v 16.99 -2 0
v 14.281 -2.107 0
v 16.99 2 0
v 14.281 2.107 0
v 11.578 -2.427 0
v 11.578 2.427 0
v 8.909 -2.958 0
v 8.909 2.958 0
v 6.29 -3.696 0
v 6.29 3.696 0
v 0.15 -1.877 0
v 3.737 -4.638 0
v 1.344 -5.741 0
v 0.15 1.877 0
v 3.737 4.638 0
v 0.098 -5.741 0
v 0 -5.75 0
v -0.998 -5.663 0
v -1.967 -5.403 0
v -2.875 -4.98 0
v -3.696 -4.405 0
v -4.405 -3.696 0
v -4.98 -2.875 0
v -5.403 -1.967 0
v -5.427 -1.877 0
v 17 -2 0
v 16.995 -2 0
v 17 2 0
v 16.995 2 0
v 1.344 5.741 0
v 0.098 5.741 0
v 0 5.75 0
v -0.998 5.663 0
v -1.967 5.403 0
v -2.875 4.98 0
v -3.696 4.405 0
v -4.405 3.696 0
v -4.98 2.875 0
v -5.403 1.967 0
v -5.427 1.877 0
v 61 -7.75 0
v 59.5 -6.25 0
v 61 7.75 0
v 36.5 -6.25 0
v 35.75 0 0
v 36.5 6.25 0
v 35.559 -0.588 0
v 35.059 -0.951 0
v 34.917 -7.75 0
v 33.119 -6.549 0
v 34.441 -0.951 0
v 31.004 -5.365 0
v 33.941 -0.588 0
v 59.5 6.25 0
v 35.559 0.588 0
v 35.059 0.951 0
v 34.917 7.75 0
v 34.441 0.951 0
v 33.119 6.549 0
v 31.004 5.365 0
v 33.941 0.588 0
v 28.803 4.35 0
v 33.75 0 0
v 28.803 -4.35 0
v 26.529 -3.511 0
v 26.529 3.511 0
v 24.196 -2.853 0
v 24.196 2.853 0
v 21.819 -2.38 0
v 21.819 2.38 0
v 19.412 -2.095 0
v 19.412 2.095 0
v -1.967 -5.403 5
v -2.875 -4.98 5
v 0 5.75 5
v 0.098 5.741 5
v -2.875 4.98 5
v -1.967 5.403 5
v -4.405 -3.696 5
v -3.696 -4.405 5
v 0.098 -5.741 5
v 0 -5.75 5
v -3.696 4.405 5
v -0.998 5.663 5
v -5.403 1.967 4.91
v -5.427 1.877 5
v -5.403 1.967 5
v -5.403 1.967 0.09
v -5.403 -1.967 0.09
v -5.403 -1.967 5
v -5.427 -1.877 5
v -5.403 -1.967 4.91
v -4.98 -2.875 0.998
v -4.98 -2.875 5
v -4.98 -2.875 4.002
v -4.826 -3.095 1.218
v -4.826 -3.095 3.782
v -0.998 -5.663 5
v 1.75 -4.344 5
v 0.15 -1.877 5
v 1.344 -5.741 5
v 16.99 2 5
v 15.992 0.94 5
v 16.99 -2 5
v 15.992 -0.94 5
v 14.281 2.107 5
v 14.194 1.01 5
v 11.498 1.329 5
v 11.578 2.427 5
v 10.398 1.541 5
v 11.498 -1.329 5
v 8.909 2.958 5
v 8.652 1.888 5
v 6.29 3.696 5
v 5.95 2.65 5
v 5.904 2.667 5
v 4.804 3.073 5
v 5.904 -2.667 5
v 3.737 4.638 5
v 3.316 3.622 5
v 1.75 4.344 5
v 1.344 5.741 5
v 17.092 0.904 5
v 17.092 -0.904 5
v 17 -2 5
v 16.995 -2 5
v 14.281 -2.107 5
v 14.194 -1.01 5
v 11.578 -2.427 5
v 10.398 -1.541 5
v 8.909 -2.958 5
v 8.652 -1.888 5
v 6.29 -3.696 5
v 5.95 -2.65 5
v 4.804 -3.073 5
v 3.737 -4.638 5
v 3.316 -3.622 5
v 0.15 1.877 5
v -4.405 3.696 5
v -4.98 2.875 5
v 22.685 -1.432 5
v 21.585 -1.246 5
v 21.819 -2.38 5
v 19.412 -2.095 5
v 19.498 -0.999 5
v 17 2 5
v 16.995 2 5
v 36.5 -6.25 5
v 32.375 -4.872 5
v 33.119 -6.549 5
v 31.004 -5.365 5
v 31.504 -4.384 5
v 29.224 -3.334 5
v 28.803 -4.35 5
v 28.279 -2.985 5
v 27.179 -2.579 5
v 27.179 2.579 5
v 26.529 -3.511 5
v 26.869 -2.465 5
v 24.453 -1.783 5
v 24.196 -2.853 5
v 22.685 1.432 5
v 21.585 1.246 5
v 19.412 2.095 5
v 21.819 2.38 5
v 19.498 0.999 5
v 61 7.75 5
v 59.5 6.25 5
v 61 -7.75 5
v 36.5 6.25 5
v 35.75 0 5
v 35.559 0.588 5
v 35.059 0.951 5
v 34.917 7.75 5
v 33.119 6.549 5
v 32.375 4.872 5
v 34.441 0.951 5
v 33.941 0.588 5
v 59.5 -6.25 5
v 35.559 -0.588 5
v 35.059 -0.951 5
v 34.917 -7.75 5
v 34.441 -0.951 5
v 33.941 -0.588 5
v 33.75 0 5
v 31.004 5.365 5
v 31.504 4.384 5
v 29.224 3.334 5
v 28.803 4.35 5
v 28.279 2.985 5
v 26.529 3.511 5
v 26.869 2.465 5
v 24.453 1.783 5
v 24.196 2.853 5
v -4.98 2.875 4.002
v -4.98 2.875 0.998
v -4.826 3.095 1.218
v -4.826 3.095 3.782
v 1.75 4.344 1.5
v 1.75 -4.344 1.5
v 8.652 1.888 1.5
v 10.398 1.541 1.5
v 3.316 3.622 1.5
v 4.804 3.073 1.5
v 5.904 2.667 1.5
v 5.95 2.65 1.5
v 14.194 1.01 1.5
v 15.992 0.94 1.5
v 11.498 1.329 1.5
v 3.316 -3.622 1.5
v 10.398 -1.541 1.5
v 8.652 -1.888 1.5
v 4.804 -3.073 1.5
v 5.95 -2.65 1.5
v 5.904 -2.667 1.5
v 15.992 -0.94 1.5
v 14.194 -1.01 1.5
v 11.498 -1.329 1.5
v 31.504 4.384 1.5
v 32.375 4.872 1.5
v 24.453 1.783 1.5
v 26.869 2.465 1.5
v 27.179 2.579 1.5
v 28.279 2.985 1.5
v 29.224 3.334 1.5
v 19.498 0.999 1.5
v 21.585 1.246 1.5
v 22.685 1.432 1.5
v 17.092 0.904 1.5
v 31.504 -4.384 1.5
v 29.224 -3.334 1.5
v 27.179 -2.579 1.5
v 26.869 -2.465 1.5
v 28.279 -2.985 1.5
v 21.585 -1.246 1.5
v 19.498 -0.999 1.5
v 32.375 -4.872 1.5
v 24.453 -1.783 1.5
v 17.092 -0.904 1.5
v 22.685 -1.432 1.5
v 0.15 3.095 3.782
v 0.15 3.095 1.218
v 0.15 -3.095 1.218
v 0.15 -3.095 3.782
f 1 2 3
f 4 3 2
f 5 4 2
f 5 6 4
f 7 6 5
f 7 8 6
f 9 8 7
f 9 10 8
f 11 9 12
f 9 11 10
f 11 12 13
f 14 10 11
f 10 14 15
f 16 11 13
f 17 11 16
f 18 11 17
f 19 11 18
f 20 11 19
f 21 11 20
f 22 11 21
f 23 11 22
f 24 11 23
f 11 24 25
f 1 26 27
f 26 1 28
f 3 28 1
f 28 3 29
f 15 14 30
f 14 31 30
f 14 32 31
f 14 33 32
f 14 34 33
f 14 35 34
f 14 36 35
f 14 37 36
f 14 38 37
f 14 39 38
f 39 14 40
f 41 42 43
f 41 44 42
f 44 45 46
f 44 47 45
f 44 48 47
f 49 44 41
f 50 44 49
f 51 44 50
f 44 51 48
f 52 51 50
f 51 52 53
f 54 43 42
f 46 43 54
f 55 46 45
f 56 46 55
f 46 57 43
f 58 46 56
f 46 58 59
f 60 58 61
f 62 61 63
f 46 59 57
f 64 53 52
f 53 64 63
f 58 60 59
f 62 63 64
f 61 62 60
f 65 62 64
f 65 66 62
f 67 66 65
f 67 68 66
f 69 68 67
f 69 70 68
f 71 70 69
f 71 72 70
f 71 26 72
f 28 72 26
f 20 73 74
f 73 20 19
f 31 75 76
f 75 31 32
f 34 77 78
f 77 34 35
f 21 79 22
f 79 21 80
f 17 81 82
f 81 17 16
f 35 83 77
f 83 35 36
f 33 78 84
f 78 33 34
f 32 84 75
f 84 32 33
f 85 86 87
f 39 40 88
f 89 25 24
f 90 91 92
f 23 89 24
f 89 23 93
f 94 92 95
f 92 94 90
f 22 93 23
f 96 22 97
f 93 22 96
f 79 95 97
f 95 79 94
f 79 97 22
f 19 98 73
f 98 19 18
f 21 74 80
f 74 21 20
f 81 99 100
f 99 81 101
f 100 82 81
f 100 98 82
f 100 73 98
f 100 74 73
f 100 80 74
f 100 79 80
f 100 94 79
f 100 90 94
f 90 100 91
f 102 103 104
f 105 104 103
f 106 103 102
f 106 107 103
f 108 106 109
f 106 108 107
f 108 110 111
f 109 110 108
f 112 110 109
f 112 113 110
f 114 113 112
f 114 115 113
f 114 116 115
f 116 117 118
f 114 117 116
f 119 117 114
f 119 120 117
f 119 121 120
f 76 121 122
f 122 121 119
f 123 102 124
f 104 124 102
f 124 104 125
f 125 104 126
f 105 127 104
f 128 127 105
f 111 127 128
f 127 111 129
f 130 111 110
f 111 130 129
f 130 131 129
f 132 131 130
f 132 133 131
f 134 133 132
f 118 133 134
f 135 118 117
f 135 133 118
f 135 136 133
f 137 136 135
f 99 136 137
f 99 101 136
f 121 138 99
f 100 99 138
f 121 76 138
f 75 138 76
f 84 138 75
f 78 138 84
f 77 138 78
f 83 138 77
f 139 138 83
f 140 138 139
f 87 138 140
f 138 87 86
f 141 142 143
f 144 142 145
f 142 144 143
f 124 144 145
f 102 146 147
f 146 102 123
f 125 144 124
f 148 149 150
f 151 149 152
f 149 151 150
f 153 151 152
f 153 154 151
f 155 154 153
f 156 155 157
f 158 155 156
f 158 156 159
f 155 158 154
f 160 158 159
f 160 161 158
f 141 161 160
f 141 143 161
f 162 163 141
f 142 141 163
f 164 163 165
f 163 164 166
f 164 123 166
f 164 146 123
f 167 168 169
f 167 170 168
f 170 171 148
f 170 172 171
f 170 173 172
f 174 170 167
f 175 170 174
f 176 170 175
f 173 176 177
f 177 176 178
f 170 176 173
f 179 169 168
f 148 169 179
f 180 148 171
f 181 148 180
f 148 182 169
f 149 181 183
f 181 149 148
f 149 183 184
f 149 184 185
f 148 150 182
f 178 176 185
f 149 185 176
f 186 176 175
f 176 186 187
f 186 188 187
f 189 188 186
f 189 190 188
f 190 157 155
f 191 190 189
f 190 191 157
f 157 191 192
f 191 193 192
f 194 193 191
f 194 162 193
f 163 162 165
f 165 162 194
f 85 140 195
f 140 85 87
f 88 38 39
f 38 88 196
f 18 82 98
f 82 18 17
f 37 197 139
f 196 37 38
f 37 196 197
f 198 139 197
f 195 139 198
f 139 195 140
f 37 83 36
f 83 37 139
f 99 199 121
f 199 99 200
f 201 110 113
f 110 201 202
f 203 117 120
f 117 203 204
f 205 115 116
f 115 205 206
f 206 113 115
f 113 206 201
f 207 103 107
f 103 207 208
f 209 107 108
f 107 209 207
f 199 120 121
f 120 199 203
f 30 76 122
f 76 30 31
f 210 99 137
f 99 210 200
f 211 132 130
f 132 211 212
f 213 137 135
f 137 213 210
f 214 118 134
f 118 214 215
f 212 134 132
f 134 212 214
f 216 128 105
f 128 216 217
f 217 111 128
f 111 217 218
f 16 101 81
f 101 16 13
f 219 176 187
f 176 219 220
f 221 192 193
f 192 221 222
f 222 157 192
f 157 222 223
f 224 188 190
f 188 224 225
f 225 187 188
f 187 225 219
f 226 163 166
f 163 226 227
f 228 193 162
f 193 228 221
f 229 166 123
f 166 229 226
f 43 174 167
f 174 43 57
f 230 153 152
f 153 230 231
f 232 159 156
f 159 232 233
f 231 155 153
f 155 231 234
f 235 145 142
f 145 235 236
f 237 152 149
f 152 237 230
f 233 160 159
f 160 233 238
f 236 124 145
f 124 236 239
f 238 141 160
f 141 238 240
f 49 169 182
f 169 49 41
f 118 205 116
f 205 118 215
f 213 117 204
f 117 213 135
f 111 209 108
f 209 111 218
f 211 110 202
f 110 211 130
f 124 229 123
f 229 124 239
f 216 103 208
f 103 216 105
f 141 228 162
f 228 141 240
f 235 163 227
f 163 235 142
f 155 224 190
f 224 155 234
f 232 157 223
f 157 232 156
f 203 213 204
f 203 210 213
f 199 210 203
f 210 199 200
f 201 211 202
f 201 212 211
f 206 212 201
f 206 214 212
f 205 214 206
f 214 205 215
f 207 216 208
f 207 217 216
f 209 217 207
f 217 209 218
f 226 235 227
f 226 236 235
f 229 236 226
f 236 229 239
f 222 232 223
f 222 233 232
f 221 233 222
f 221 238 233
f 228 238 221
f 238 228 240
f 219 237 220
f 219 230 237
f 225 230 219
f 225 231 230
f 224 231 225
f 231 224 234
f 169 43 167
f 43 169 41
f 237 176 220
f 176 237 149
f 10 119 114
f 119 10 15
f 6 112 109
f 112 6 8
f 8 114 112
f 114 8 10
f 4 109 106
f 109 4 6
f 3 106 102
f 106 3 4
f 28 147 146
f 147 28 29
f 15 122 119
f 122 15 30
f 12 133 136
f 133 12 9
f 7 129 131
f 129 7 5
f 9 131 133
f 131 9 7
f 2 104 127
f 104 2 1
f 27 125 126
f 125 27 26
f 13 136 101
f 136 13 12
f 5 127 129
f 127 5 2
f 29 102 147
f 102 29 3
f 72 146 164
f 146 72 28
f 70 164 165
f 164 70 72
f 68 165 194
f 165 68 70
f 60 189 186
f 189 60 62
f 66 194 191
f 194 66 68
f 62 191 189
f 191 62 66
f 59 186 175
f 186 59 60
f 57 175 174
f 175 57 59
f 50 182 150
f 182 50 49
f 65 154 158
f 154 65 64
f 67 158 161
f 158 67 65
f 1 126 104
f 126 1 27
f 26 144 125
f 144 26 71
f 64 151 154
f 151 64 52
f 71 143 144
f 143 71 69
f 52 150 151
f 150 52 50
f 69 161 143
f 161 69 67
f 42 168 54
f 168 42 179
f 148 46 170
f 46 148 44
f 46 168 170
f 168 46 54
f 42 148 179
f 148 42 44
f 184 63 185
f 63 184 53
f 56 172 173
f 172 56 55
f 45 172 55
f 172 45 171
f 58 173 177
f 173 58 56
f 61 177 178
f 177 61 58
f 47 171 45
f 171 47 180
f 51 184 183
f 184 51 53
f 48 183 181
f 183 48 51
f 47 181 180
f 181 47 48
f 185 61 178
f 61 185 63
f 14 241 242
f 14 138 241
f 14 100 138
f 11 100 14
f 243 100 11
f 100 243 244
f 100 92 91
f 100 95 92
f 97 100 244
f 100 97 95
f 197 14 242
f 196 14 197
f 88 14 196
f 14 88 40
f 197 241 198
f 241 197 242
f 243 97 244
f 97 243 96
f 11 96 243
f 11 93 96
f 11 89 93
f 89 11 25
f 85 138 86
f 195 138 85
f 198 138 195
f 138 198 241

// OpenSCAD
// leg length and servo center position  
servoposition=48;

// constrinction's position (middle part)
cons = 17;

// Thickness of the middle part
ralt=4;	

// Servo boarder thickness
svbt=1.5;

// Number of sabilizers
num=5;		
		
// Rubber clamp diameter 	
plateau =11.5;   
	
// Bottom wall height
wall=1.5;	
		
// Bridge sabiziber width
stab=1.1;			

// Overall thickness of the leg		
zdim=5;		

// Servo length
sl = 23;

// Servo width
sw = 12.5;	

// Servo mounting holes radius
smhr = 1;

// Servo mounting holes distance
smhd = 26.5;

// rubber diameter
rubd = 6.7;

// rubber retension height
rubh = 6;

// Do you need two servo mounting holes?
two_se = false;


//////////////////////////////////////////////////////////////////////////////////////////////
// Servo rubber leg
//
// Copyright (C) 2013  Lochner, Juergen
// http://www.thingiverse.com/Ablapo/designs
//
// This program is free software; you can redistribute it and/or
// modify it under the terms of the GNU General Public License
// as published by the Free Software Foundation; either version 2
// of the License, or (at your option) any later version.
//
// This program is distributed in the hope that it will be useful,
// but WITHOUT ANY WARRANTY; without even the implied warranty of
// MERCHANTABILITY or FITNESS FOR A PARTICULAR PURPOSE.  See the
// GNU General Public License for more details.
//
// You should have received a copy of the GNU General Public License
// along with this program; if not, write to the Free Software
// Foundation, Inc., 51 Franklin Street, Fifth Floor, Boston, MA  02110-1301, USA.
/////////////////////////////////////////////////////////////////////////////////////////////////


module servo(){
	cube([sl,sw,40],center=true);
	translate([-smhd/2,0,0]) cylinder(r=smhr, h=40,center=true,$fn=10);
	if (two_se==true) {translate([smhd/2,0,0]) cylinder(r=smhr, h=40,center=true,$fn=10);}
}



nustart=(servoposition-sl/2-svbt-plateau/4)/(num+1);										// calculate start position for sabilizers
nudist=(servoposition-sl/2-svbt-plateau/8)/(num+1);										// calculate distance of stabilizers

rcut = ( cons*cons +ralt*ralt/4 - plateau*plateau/4)/2/(plateau/2-ralt/2);				// rubber, calculate cutting radius
bwidth = plateau/2* sin(atan((ralt/2+rcut)/ralt*2) )*2;									// rubber, calculate bridge width

bwidth_sv=sw+svbt*2;																// servo, calculate bridge width

svalpha=60;
svplat=(sw/2+svbt)/sin(svalpha)*2 ;
svcons=servoposition-cons-sl/2-svbt+cos(svalpha)*svplat/2;

//#translate([cons+svcons,0,0])cylinder(h=zdim,r=svplat/2);

svrcut = ( svcons*svcons +ralt*ralt/4 - svplat*svplat/4)/2/(svplat/2-ralt/2);				// servo, calculate cutting radius



rubcut=1.5+rubh-plateau/2;															// rubber clamp cut position

difference(){
	union(){	
		difference(){																									// rubber clamp
			translate([0,0,(zdim)/2]) cylinder (h=zdim,r=plateau/2, center=true,$fn=36);								
			if (rubcut>1.5) {translate([(plateau+1)/2+rubcut,0,(zdim+2)/2-1]) cube ([plateau+1,plateau+1,zdim+2], center=true);}
			else {translate([(plateau+1)/2+1.5,0,(zdim+2)/2-1]) cube ([plateau+1,plateau+1,zdim+2], center=true);}		
		}

		translate([cons/2,0,wall/2]) cube([cons,bwidth,wall],center=true);											// bridge bottom wall rubber part
		translate([(servoposition-cons)/2+cons,0,wall/2]) cube([servoposition-cons,bwidth_sv,wall],center=true);		// bridge bottom wall servo part



		intersection(){																									// upper side wall rubber part
			translate([cons,rcut+ralt/2,zdim/2]) cylinder (h=zdim+1,r=rcut+stab, center=true,$fn=80);	
			translate([cons/2,0,zdim/2]) cube([cons,bwidth,zdim],center=true);		
		}
		intersection(){																									// lower side wall rubber part
			translate([cons,-(rcut+ralt/2),zdim/2]) cylinder (h=zdim+1,r=rcut+stab, center=true,$fn=80);	
			translate([cons/2,0,zdim/2]) cube([cons,bwidth,zdim],center=true);		
		}


		intersection(){																									// upper side wall servo part
			translate([cons-0.01,svrcut+ralt/2,zdim/2]) cylinder (h=zdim+1,r=svrcut+stab, center=true,$fn=80);	
			translate([svcons/2+cons-0.01,0,zdim/2]) cube([svcons,bwidth_sv,zdim],center=true);		
		}
		intersection(){																									// lower side wall servo part
			translate([cons-0.01,-(svrcut+ralt/2),zdim/2]) cylinder (h=zdim+1,r=svrcut+stab, center=true,$fn=80);	
			translate([svcons/2+cons-0.01,0,zdim/2]) cube([svcons,bwidth_sv,zdim],center=true);		
		}


		for (i = [0:1:num-1]) {translate([nustart+i*nudist,0,zdim/2]) cube([stab,bwidth,zdim],center=true);	}		// stabilizers

		if (two_se!=true) {translate ([servoposition-(smhd-sl)/2*1.5/2,0,zdim/2]) cube([sl+2*svbt+(smhd-sl)/2*1.5,sw+2*svbt,zdim], center=true);}			// servo frame 1 mounting hole
		else  {translate ([servoposition,0,zdim/2]) cube([sl+(smhd-sl)/2*2.2*2,sw+2*svbt,zdim], center=true);}	// servo frame with 2 mounting holes	
	
		
	}

	
	translate([cons,rcut+ralt/2,zdim/2]) difference(){ 								// cut round shape upper rubber part
			cylinder (h=zdim+1,r=rcut, center=true,$fn=80);										
			translate([rcut/2,-(rcut+1)/2,0]) cube ([rcut,rcut+1,zdim+2],center=true);
			}

	translate([cons,-(rcut+ralt/2),zdim/2]) difference(){ 							// cut round shape lower rubber part
			cylinder (h=zdim+1,r=rcut, center=true,$fn=80);		
			translate([rcut/2, (rcut+1)/2,0]) cube ([rcut,rcut+1,zdim+2],center=true);
			}

	translate([cons-0.01,svrcut+ralt/2,zdim/2]) difference(){ 								// cut round shape upper servo part
			cylinder (h=zdim+1,r=svrcut, center=true,$fn=80);										
			translate([-svrcut/2,-(svrcut+1)/2,0]) cube ([svrcut,svrcut+1,zdim+2],center=true);
			}

	translate([cons-0.01,-(svrcut+ralt/2),zdim/2]) difference(){ 							// cut round shape lower servo part
			cylinder (h=zdim+1,r=svrcut, center=true,$fn=80);		
			translate([-svrcut/2, (svrcut+1)/2,0]) cube ([svrcut,svrcut+1,zdim+2],center=true);
			}


#	translate([servoposition,0,0]) servo();		// servo mount cut
	translate([-plateau/2+rubh/2-0.1,0,+rubd/2-(rubd-zdim)/2]) rotate([ 0,90,0])rotate([0,0,360/2/8]) cylinder(r=rubd/2,h=rubh,center=true,$fn=8);  // cut rubber
}
